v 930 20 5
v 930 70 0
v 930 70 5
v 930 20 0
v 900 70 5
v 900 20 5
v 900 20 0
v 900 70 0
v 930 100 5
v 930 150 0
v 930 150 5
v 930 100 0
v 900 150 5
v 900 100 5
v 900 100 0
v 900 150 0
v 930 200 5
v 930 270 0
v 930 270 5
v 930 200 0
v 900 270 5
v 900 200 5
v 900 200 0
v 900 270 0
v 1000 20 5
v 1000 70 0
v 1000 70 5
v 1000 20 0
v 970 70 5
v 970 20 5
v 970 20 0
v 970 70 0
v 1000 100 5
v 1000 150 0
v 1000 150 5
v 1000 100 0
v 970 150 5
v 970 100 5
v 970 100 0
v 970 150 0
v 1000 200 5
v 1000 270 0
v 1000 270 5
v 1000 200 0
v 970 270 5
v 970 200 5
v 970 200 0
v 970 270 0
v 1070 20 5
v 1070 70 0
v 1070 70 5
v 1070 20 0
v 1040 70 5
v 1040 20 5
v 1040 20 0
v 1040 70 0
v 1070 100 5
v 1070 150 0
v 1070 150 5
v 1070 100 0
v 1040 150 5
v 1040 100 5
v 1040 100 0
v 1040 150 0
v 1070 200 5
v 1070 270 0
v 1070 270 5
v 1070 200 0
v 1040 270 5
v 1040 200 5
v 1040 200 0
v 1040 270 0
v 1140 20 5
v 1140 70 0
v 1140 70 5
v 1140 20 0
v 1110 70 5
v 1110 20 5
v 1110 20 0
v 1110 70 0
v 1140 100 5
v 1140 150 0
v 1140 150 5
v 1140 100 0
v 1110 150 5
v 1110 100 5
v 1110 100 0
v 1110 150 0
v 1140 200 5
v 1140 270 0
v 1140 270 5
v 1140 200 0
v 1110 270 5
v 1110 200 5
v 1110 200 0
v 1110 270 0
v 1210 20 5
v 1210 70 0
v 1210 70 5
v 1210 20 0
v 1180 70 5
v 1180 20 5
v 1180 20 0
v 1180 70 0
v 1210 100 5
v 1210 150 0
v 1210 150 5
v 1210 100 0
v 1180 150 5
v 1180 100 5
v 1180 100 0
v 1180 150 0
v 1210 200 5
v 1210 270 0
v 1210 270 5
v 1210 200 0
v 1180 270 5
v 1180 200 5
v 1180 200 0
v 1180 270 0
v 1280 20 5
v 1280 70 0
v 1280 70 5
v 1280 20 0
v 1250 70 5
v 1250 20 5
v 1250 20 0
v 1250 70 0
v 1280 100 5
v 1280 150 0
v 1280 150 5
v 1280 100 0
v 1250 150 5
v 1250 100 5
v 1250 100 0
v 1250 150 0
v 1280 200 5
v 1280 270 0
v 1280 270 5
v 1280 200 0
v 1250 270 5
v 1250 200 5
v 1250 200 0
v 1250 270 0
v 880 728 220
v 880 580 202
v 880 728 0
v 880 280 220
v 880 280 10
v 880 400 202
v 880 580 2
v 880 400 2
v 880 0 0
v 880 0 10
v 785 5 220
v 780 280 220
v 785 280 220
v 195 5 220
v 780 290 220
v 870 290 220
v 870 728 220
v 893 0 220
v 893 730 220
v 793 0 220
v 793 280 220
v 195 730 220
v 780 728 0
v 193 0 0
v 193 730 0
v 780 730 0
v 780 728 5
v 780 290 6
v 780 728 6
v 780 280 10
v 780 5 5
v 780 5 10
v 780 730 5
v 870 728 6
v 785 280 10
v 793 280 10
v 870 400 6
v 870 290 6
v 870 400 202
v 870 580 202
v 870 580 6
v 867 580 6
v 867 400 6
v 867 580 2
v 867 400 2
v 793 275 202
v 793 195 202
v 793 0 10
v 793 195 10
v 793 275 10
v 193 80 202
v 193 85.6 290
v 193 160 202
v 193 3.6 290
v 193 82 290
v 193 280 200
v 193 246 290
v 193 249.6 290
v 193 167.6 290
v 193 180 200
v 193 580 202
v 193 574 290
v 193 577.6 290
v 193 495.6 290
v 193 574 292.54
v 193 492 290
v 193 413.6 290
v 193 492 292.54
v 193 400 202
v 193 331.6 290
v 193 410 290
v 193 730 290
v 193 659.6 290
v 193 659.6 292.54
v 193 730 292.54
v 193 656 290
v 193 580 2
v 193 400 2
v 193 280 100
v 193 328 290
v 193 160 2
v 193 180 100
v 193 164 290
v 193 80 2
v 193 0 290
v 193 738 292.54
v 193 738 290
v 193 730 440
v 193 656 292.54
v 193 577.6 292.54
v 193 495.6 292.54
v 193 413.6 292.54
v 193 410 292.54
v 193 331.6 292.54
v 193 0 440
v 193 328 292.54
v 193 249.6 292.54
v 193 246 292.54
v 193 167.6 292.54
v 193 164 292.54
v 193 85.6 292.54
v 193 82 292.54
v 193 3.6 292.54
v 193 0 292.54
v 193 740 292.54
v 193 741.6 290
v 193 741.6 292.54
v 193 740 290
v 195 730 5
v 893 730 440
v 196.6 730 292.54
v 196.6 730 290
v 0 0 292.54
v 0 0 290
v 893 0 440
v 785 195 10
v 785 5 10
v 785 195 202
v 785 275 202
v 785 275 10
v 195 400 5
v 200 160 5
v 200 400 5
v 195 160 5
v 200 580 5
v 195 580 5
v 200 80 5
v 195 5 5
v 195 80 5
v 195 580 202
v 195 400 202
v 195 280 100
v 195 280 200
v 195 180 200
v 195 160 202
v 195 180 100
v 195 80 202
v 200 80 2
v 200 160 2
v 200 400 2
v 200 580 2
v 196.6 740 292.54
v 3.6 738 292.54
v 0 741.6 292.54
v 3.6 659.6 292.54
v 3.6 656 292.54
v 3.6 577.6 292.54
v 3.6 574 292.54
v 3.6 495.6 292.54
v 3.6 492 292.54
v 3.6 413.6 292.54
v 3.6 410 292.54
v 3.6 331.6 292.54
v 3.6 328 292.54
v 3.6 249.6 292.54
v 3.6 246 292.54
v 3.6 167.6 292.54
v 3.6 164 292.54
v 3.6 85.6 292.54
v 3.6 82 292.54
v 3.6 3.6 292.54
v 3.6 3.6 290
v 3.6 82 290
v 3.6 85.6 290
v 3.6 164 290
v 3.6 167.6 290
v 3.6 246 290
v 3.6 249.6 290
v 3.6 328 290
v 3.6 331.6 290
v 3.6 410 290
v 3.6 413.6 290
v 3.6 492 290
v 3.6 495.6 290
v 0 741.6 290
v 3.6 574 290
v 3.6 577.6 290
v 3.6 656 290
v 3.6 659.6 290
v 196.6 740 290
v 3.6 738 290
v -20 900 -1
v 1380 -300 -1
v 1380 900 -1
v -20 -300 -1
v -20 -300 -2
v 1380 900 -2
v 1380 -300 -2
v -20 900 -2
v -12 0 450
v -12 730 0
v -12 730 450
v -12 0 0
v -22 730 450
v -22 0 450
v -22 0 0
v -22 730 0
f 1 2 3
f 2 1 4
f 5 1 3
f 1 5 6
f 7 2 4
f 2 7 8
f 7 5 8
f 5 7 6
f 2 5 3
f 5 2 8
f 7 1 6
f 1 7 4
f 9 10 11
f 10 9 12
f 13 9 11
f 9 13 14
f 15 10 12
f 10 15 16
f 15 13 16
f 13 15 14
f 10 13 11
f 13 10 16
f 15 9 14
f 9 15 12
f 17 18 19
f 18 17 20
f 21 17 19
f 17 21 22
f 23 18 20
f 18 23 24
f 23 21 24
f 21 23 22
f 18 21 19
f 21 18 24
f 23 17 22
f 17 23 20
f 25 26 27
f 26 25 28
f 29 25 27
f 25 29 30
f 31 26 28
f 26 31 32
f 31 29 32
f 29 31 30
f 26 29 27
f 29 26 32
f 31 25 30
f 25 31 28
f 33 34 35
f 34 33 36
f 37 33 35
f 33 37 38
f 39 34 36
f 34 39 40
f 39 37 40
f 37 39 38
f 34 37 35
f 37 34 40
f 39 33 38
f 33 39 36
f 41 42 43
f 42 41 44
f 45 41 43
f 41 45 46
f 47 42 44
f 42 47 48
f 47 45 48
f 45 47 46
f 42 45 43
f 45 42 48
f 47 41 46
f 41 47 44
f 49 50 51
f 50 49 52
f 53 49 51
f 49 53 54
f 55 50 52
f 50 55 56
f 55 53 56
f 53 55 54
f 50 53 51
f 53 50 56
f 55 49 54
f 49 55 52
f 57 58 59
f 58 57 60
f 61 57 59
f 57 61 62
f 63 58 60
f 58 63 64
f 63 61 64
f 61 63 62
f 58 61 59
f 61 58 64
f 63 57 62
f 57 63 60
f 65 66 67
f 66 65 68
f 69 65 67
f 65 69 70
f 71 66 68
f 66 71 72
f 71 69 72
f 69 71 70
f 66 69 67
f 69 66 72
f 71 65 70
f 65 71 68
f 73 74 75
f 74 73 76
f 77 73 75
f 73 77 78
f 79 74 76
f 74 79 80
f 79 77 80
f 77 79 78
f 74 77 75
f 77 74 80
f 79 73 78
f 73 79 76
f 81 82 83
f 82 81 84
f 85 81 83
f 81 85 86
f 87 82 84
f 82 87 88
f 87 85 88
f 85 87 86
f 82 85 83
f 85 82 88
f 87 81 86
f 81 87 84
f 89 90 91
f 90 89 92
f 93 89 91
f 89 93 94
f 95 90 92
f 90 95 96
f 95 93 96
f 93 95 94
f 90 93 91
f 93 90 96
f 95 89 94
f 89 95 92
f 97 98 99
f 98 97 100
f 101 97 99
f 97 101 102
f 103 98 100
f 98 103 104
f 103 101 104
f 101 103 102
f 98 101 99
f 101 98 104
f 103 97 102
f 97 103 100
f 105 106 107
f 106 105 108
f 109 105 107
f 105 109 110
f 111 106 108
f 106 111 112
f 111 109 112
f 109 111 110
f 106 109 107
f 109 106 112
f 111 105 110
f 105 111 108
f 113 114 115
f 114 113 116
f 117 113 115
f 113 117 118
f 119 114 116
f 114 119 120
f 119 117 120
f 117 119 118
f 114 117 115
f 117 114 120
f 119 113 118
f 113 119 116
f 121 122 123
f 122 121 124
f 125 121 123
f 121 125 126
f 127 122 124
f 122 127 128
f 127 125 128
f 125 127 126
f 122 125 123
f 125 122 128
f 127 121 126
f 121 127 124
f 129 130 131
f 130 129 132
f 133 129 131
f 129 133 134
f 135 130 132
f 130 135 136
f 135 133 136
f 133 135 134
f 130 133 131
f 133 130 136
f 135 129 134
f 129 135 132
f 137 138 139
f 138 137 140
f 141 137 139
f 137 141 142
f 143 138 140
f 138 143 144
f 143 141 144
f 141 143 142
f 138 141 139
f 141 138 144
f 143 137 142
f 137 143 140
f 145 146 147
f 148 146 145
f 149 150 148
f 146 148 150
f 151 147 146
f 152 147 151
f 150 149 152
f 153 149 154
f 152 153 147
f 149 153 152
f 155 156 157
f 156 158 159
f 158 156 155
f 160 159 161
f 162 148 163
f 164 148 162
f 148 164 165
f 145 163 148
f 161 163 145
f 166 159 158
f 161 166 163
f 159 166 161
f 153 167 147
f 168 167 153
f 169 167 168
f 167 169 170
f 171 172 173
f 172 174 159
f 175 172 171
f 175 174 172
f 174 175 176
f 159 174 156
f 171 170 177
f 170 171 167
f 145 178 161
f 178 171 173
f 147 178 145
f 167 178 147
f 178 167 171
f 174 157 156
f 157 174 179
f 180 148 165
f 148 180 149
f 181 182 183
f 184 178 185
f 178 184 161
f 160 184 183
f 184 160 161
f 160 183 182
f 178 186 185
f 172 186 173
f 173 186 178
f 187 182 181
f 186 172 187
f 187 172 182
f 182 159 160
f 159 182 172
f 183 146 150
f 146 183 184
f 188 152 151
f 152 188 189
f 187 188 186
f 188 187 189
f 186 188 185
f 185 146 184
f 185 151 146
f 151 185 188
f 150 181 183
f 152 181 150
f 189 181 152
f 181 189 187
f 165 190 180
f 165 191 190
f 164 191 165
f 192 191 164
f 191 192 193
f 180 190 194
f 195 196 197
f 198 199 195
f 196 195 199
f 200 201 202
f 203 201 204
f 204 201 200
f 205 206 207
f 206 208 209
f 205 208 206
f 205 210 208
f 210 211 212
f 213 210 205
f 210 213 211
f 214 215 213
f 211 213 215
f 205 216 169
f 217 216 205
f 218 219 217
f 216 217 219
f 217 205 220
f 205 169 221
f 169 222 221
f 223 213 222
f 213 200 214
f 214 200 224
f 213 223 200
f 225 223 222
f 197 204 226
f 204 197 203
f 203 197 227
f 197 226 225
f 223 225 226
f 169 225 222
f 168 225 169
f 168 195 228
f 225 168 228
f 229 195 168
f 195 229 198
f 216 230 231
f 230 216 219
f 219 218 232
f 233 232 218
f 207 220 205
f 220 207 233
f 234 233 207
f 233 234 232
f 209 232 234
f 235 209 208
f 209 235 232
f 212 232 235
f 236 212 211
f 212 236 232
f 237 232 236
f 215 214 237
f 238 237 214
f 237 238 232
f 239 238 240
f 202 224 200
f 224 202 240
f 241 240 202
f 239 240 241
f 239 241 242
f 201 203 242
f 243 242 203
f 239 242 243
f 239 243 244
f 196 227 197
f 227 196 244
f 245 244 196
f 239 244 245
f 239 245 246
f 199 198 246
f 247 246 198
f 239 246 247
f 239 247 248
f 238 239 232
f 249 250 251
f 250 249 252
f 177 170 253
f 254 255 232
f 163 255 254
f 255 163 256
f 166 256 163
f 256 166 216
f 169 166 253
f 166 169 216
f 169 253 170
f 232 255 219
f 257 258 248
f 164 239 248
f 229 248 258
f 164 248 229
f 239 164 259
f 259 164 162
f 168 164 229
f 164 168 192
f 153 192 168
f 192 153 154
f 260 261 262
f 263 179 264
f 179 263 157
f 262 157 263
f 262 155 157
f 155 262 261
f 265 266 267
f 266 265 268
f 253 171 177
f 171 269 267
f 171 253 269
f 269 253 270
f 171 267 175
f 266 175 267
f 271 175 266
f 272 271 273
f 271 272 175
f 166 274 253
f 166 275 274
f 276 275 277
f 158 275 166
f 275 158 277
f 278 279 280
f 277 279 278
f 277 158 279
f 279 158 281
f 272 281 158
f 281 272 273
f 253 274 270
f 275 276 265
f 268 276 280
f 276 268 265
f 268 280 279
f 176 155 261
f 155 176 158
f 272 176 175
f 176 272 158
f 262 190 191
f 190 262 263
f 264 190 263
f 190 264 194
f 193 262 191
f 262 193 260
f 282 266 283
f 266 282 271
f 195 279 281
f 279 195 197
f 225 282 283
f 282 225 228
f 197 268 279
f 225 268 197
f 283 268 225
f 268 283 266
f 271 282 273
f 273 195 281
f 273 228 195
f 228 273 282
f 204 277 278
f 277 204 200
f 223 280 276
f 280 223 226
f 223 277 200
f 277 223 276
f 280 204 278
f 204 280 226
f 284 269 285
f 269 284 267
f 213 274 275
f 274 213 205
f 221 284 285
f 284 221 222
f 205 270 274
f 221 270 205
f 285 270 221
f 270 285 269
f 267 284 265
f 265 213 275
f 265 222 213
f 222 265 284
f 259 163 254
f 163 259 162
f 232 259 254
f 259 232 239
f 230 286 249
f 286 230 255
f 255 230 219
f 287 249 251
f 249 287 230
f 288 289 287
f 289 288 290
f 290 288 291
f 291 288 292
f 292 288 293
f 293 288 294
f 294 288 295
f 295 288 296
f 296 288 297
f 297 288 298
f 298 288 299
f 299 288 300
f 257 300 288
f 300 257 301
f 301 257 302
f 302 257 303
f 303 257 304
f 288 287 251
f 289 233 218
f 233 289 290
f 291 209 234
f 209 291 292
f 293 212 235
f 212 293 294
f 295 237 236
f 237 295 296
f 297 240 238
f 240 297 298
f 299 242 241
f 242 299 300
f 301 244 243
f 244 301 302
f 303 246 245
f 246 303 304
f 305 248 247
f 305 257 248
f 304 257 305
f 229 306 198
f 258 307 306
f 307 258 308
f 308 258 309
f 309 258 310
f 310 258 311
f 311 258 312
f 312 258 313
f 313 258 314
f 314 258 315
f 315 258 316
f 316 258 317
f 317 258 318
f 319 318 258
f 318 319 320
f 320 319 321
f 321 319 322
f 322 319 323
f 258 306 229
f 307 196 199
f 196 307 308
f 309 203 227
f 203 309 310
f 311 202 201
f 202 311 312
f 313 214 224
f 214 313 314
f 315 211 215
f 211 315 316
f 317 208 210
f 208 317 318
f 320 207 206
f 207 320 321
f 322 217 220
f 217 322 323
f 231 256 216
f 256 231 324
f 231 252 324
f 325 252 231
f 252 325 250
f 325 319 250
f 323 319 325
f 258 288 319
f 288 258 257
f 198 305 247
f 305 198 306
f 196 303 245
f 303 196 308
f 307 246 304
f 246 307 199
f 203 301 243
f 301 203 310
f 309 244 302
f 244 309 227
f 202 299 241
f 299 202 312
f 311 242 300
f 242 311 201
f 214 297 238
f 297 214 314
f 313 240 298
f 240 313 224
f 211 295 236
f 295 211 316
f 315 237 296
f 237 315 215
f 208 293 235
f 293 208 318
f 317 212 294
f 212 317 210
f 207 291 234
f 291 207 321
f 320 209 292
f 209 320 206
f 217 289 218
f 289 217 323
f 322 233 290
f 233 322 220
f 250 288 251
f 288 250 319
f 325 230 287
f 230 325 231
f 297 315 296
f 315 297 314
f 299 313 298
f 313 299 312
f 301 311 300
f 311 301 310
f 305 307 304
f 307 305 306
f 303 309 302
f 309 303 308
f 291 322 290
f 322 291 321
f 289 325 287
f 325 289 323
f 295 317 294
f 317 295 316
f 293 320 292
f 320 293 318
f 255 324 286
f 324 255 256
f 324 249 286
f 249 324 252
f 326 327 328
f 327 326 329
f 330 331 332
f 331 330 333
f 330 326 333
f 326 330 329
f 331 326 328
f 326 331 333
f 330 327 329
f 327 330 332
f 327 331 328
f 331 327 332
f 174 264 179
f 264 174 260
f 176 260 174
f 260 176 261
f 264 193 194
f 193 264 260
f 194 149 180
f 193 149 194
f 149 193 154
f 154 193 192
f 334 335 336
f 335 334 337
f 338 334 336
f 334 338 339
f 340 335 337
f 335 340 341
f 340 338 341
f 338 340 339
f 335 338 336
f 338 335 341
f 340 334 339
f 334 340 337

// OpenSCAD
color([1,1,9]) 
translate([-20,-300,-2]) 
cube([800,1200,1]); 

color([0,.7,0]) 
translate([780,-300,-2]) 
cube([600,1200,1]); 

for (y=[0:70:360]){ 
	color([1,1,1]) 
	translate([900+y,20,0]) 
	cube([30,50,5]); 

	color([1,1,1]) 
	translate([900+y,100,0]) 
	cube([30,50,5]); 

	color([1,1,1]) 
	translate([900+y,200,0]) 
	cube([30,70,5]); 
	} 
	
	//Outdoor front window 
	color([1,1,1]) 
	translate([780,0,0]) 
	cube([100,280,10]); 

module casa (){ 
	difference () {
		translate([800-20,280,0]) 
		cube([100,448,220]); 
		
		//
		color([0,1,1])
		translate([770,290,6]) 
		cube([100,450,220]); 
		
		//Outdoor Behia
		color([0,1,1])
		translate([867,400,2]) 
		cube([20,180,200]); 
		} 
	
		difference(){ 
			translate([193,0,0]) 
			cube([600,730,220]); 

			//Fonde home
			color([0,1,1])
			translate([195,5,5]) 
			cube([600-10,740,220]); 
			
			//Outdoor front Door 
			color([0,1,1])
			translate([800-20,195,2]) 
			cube([20,80,200]); 

			//Outdoor front
			color([0,1,1]) 
			translate([800-20,289,0]) 
			cube([22,442,222]); 
			
			//Base Laddder
			translate([670,2,2]) 
			%cube([10,280,120]); 
			
			//for(x=[0:25:200]){ 
				//color([1,1,1]) 
				//translate([550,260-x,x+2])
				//%cube([120,20,20]); 
				//} 
				
				//Outdoor Behia 
				translate([190,80,2]) 
				cube([10,80,200]); 
	
				//Outdoor Behia 
				translate([190,180,100]) 
				cube([10,100,100]); 

				//Outdoor Behia 
				translate([190,400,2]) 
				cube([10,180,200]); 

				//Chicke 
				translate([200,2,2]) 
				%cube([350,300,220]); } 
				
				//PLante High 
				translate([193,0,220]) 
				cube([700,730,220]); 
} 

module estructura () { 
	for (z=[0:82:750]) 
		color([5,2,0]) 
		translate([0,0+z,290]) 
		cube([193,3.6,2.54]); 
	
		color([5,2,0]) 
		translate([0,0,290]) 
		cube([3.6,740,2.54]); 
		
		color([5,2,0]) 
		translate([193,0,290]) 
		cube([3.6,740,2.54]); 
	
		//Policarbonato 	
		translate([0,0,291]) 
		%cube([193,415,1]); 
	} 



module wall (){ 
	translate([-22,0,0])
	#cube([10,730,450]); 	
	
	translate([-10,0,260]) 
	%cube([30,730,20]);
 
	translate([-10,0,0]) 
	%cube([10,730,260]); 
	
	translate([0,0,0]) 	
	%cube([200,10,280]); 
	
	translate([0,730,0]) 
	%cube([200,10,280]); 
} 

casa(); 
wall(); 
estructura();
